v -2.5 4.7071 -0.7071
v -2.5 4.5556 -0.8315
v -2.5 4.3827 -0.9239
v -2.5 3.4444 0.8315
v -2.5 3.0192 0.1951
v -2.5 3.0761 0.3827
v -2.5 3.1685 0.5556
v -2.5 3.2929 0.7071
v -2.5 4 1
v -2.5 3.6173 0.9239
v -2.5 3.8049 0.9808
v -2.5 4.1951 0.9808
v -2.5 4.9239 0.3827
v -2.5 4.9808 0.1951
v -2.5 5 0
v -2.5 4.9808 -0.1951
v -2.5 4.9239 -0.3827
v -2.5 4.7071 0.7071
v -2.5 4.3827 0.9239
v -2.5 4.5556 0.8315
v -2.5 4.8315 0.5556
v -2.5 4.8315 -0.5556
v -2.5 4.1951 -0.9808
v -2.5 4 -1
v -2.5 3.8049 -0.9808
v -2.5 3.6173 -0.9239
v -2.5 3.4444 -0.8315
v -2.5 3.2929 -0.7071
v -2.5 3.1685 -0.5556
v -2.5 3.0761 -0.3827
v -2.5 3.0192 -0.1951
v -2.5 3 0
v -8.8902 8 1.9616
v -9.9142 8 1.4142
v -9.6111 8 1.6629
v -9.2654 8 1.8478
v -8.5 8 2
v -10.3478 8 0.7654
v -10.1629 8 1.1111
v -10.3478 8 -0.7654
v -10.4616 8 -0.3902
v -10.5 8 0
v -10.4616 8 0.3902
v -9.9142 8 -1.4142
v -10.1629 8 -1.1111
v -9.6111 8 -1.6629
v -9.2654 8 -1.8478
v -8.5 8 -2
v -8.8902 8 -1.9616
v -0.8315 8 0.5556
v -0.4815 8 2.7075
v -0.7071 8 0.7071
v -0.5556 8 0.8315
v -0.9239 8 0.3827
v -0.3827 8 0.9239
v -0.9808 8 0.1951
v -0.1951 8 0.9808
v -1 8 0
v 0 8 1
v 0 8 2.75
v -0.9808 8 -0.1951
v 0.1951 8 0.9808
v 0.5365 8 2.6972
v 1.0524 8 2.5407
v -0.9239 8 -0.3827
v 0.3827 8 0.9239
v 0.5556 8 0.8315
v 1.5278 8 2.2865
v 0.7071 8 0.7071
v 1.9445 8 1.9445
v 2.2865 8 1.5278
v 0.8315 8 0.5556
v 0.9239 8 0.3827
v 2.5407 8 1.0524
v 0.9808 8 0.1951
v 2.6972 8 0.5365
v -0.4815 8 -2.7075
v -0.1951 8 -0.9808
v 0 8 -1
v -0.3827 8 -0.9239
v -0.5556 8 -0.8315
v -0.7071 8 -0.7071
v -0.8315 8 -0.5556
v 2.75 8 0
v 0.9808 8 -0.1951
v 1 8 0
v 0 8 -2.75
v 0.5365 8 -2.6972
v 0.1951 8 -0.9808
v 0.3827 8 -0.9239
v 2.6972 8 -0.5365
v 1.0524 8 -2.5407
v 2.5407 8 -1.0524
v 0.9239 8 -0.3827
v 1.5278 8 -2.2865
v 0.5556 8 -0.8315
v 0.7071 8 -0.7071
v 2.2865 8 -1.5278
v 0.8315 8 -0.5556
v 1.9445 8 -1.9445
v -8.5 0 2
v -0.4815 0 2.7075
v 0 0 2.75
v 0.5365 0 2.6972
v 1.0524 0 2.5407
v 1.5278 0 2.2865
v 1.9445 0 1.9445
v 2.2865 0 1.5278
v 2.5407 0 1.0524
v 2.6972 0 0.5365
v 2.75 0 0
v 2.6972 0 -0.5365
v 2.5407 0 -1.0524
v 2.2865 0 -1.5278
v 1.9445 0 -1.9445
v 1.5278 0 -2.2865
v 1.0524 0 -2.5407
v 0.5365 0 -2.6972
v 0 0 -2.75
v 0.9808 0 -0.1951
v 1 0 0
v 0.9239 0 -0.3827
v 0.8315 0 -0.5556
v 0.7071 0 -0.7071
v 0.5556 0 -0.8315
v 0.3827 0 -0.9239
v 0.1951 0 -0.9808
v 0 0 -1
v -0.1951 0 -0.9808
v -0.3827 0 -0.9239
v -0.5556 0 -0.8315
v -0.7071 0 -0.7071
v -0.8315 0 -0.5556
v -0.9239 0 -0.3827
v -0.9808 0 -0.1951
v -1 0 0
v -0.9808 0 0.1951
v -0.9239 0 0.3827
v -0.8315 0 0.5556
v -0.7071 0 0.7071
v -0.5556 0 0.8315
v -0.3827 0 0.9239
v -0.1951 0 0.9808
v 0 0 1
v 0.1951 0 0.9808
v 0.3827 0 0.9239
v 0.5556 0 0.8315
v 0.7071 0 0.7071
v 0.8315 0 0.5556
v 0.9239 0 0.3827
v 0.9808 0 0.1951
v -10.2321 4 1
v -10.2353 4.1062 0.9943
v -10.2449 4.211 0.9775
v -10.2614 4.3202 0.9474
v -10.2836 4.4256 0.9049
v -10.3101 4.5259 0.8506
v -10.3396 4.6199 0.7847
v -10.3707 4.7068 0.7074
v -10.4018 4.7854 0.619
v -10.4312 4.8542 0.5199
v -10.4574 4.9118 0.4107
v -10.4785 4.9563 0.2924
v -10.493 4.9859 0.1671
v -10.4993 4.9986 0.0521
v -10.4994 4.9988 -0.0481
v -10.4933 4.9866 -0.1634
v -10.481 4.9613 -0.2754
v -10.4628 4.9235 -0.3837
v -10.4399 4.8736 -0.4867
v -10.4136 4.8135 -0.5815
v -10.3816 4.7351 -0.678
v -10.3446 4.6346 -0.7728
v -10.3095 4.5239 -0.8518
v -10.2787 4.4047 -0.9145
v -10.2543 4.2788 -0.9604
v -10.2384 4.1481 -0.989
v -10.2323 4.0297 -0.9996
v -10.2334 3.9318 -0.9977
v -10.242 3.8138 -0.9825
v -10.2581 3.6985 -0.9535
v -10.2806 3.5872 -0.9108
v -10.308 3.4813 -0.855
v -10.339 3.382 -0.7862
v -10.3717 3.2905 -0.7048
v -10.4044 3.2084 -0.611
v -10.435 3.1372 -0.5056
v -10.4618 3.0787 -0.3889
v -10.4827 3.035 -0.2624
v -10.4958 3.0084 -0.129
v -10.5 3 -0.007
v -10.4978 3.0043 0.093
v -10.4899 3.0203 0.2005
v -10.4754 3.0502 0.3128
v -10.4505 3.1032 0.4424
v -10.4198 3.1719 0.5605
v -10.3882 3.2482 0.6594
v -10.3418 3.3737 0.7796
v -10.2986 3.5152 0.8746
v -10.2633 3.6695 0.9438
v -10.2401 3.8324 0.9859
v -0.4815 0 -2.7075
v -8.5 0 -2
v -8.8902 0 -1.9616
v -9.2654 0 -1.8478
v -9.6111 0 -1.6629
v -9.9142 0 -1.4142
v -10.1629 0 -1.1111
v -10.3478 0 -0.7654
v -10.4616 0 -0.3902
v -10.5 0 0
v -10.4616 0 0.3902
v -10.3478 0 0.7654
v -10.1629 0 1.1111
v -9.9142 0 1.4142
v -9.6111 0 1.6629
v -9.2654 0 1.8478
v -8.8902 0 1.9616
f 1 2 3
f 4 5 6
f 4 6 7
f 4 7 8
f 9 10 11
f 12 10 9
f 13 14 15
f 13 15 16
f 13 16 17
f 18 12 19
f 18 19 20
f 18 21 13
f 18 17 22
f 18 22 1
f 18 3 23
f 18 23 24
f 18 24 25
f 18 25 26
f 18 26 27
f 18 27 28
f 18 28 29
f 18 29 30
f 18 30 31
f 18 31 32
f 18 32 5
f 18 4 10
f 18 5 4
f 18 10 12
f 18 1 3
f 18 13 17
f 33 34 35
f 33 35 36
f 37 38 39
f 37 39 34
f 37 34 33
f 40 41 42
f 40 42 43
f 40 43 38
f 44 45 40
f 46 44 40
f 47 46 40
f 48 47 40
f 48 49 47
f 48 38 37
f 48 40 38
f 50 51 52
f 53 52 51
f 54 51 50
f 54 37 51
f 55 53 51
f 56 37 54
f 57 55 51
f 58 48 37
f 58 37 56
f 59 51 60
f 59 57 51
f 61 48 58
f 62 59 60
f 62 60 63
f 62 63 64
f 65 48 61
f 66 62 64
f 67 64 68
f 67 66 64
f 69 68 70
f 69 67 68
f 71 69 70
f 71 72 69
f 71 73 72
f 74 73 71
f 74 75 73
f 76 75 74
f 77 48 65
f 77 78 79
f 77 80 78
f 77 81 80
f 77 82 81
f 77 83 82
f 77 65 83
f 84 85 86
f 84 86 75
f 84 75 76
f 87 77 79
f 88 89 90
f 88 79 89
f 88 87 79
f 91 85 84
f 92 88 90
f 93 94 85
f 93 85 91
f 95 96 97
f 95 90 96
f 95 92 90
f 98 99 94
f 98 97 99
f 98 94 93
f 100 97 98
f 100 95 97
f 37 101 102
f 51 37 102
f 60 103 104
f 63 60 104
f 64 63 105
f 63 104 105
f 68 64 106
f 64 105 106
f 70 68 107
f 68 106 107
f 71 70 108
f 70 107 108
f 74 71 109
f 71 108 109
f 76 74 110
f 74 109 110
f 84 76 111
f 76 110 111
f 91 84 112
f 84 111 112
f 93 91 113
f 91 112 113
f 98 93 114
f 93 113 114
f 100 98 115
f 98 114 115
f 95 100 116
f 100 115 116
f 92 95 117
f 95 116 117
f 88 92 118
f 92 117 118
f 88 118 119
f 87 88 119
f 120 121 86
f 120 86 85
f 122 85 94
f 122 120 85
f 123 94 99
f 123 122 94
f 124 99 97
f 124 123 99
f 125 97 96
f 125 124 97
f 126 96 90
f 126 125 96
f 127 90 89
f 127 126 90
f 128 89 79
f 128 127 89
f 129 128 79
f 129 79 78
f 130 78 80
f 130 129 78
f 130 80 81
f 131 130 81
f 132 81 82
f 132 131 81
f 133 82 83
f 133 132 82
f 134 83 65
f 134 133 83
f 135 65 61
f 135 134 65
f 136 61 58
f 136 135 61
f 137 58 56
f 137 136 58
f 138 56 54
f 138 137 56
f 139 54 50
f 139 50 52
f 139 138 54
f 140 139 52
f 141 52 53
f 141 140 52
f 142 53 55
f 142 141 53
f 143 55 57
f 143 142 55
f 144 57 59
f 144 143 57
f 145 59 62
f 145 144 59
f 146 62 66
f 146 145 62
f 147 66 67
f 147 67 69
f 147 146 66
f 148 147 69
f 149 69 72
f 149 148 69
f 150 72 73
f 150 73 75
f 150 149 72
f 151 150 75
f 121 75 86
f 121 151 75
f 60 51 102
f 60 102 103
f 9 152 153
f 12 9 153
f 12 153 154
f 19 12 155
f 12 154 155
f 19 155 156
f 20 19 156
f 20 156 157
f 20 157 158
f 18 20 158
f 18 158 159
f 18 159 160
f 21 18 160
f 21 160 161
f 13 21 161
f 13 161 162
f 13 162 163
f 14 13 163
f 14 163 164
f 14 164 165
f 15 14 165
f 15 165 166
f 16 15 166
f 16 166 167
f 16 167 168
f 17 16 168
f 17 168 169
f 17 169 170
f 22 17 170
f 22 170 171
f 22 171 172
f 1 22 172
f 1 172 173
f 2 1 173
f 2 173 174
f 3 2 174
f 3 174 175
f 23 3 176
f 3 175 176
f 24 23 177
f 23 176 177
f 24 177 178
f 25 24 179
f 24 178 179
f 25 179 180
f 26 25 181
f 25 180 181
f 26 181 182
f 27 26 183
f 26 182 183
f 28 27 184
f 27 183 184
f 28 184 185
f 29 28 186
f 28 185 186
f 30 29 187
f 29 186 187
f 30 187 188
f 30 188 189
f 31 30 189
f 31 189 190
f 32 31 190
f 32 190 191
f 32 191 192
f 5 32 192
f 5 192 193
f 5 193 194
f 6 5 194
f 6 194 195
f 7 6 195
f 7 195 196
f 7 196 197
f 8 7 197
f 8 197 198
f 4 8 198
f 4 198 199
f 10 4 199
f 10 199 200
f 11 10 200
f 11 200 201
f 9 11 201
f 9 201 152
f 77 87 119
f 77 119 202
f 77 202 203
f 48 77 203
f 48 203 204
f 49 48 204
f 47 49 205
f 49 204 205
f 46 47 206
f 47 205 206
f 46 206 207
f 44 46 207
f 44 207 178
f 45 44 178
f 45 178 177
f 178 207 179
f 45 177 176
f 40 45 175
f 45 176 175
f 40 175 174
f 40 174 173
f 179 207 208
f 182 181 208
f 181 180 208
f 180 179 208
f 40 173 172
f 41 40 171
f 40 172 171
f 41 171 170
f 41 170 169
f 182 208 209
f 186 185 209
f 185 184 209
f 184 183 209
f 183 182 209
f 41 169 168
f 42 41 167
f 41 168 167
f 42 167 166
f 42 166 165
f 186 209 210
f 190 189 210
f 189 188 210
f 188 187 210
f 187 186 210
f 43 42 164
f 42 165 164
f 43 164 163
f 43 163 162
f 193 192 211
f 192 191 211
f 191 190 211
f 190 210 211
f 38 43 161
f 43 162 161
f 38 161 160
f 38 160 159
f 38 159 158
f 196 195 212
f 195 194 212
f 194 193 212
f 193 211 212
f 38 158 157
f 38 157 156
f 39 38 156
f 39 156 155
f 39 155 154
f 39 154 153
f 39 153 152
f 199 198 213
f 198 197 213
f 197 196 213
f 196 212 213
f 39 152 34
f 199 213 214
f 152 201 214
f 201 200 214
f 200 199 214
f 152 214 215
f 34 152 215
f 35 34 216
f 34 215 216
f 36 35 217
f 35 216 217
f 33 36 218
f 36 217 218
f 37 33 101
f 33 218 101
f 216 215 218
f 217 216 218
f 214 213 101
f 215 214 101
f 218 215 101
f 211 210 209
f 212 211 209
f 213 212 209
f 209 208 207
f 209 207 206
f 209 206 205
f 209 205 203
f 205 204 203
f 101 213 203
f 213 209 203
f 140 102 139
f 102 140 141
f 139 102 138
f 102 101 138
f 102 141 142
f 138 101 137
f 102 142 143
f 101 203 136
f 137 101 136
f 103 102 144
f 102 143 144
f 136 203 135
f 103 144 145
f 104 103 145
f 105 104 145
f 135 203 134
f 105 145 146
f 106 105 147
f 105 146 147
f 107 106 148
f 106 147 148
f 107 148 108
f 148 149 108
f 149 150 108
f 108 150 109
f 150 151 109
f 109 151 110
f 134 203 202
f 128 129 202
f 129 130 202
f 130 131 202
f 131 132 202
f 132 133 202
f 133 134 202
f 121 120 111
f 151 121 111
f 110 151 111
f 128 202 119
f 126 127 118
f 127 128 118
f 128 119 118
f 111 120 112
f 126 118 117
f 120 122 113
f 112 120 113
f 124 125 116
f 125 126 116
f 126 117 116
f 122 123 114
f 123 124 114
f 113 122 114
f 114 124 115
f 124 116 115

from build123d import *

# Parameters (mm, degrees)
SKETCH1_R           = 1
BOSS_EXTRUDE1_DEPTH = 8
SKETCH2_R           = 1
CUT_EXTRUDE1_DEPTH  = 8


with BuildPart() as part:
    # Sketch1 → Boss-Extrude1 (new body)
    with BuildSketch(Plane(origin=(0, 0, 0), x_dir=(1, 0, 0), z_dir=(0, 1, 0))):
        with BuildLine():
            Line((-0.481545064, 2.70751073), (-8.5, 2))
            ThreePointArc((-8.5, 2), (-10.5, 0), (-8.5, -2))
            Line((-8.5, -2), (-0.481545064, -2.70751073))
            Line((-0.481545064, -2.70751073), (0, -2.75))
            ThreePointArc((0, -2.75), (2.75, 0), (0, 2.75))
            Line((0, 2.75), (-0.481545064, 2.70751073))
        make_face()
        Circle(SKETCH1_R, mode=Mode.SUBTRACT)
    extrude(amount=BOSS_EXTRUDE1_DEPTH)

    # Sketch2 → Cut-Extrude1 (cut)
    with BuildSketch(Plane.ZY.offset(10.5)):
        with Locations((0, 4)):
            Circle(SKETCH2_R)
    extrude(amount=-CUT_EXTRUDE1_DEPTH, mode=Mode.SUBTRACT)


solid = part.part
